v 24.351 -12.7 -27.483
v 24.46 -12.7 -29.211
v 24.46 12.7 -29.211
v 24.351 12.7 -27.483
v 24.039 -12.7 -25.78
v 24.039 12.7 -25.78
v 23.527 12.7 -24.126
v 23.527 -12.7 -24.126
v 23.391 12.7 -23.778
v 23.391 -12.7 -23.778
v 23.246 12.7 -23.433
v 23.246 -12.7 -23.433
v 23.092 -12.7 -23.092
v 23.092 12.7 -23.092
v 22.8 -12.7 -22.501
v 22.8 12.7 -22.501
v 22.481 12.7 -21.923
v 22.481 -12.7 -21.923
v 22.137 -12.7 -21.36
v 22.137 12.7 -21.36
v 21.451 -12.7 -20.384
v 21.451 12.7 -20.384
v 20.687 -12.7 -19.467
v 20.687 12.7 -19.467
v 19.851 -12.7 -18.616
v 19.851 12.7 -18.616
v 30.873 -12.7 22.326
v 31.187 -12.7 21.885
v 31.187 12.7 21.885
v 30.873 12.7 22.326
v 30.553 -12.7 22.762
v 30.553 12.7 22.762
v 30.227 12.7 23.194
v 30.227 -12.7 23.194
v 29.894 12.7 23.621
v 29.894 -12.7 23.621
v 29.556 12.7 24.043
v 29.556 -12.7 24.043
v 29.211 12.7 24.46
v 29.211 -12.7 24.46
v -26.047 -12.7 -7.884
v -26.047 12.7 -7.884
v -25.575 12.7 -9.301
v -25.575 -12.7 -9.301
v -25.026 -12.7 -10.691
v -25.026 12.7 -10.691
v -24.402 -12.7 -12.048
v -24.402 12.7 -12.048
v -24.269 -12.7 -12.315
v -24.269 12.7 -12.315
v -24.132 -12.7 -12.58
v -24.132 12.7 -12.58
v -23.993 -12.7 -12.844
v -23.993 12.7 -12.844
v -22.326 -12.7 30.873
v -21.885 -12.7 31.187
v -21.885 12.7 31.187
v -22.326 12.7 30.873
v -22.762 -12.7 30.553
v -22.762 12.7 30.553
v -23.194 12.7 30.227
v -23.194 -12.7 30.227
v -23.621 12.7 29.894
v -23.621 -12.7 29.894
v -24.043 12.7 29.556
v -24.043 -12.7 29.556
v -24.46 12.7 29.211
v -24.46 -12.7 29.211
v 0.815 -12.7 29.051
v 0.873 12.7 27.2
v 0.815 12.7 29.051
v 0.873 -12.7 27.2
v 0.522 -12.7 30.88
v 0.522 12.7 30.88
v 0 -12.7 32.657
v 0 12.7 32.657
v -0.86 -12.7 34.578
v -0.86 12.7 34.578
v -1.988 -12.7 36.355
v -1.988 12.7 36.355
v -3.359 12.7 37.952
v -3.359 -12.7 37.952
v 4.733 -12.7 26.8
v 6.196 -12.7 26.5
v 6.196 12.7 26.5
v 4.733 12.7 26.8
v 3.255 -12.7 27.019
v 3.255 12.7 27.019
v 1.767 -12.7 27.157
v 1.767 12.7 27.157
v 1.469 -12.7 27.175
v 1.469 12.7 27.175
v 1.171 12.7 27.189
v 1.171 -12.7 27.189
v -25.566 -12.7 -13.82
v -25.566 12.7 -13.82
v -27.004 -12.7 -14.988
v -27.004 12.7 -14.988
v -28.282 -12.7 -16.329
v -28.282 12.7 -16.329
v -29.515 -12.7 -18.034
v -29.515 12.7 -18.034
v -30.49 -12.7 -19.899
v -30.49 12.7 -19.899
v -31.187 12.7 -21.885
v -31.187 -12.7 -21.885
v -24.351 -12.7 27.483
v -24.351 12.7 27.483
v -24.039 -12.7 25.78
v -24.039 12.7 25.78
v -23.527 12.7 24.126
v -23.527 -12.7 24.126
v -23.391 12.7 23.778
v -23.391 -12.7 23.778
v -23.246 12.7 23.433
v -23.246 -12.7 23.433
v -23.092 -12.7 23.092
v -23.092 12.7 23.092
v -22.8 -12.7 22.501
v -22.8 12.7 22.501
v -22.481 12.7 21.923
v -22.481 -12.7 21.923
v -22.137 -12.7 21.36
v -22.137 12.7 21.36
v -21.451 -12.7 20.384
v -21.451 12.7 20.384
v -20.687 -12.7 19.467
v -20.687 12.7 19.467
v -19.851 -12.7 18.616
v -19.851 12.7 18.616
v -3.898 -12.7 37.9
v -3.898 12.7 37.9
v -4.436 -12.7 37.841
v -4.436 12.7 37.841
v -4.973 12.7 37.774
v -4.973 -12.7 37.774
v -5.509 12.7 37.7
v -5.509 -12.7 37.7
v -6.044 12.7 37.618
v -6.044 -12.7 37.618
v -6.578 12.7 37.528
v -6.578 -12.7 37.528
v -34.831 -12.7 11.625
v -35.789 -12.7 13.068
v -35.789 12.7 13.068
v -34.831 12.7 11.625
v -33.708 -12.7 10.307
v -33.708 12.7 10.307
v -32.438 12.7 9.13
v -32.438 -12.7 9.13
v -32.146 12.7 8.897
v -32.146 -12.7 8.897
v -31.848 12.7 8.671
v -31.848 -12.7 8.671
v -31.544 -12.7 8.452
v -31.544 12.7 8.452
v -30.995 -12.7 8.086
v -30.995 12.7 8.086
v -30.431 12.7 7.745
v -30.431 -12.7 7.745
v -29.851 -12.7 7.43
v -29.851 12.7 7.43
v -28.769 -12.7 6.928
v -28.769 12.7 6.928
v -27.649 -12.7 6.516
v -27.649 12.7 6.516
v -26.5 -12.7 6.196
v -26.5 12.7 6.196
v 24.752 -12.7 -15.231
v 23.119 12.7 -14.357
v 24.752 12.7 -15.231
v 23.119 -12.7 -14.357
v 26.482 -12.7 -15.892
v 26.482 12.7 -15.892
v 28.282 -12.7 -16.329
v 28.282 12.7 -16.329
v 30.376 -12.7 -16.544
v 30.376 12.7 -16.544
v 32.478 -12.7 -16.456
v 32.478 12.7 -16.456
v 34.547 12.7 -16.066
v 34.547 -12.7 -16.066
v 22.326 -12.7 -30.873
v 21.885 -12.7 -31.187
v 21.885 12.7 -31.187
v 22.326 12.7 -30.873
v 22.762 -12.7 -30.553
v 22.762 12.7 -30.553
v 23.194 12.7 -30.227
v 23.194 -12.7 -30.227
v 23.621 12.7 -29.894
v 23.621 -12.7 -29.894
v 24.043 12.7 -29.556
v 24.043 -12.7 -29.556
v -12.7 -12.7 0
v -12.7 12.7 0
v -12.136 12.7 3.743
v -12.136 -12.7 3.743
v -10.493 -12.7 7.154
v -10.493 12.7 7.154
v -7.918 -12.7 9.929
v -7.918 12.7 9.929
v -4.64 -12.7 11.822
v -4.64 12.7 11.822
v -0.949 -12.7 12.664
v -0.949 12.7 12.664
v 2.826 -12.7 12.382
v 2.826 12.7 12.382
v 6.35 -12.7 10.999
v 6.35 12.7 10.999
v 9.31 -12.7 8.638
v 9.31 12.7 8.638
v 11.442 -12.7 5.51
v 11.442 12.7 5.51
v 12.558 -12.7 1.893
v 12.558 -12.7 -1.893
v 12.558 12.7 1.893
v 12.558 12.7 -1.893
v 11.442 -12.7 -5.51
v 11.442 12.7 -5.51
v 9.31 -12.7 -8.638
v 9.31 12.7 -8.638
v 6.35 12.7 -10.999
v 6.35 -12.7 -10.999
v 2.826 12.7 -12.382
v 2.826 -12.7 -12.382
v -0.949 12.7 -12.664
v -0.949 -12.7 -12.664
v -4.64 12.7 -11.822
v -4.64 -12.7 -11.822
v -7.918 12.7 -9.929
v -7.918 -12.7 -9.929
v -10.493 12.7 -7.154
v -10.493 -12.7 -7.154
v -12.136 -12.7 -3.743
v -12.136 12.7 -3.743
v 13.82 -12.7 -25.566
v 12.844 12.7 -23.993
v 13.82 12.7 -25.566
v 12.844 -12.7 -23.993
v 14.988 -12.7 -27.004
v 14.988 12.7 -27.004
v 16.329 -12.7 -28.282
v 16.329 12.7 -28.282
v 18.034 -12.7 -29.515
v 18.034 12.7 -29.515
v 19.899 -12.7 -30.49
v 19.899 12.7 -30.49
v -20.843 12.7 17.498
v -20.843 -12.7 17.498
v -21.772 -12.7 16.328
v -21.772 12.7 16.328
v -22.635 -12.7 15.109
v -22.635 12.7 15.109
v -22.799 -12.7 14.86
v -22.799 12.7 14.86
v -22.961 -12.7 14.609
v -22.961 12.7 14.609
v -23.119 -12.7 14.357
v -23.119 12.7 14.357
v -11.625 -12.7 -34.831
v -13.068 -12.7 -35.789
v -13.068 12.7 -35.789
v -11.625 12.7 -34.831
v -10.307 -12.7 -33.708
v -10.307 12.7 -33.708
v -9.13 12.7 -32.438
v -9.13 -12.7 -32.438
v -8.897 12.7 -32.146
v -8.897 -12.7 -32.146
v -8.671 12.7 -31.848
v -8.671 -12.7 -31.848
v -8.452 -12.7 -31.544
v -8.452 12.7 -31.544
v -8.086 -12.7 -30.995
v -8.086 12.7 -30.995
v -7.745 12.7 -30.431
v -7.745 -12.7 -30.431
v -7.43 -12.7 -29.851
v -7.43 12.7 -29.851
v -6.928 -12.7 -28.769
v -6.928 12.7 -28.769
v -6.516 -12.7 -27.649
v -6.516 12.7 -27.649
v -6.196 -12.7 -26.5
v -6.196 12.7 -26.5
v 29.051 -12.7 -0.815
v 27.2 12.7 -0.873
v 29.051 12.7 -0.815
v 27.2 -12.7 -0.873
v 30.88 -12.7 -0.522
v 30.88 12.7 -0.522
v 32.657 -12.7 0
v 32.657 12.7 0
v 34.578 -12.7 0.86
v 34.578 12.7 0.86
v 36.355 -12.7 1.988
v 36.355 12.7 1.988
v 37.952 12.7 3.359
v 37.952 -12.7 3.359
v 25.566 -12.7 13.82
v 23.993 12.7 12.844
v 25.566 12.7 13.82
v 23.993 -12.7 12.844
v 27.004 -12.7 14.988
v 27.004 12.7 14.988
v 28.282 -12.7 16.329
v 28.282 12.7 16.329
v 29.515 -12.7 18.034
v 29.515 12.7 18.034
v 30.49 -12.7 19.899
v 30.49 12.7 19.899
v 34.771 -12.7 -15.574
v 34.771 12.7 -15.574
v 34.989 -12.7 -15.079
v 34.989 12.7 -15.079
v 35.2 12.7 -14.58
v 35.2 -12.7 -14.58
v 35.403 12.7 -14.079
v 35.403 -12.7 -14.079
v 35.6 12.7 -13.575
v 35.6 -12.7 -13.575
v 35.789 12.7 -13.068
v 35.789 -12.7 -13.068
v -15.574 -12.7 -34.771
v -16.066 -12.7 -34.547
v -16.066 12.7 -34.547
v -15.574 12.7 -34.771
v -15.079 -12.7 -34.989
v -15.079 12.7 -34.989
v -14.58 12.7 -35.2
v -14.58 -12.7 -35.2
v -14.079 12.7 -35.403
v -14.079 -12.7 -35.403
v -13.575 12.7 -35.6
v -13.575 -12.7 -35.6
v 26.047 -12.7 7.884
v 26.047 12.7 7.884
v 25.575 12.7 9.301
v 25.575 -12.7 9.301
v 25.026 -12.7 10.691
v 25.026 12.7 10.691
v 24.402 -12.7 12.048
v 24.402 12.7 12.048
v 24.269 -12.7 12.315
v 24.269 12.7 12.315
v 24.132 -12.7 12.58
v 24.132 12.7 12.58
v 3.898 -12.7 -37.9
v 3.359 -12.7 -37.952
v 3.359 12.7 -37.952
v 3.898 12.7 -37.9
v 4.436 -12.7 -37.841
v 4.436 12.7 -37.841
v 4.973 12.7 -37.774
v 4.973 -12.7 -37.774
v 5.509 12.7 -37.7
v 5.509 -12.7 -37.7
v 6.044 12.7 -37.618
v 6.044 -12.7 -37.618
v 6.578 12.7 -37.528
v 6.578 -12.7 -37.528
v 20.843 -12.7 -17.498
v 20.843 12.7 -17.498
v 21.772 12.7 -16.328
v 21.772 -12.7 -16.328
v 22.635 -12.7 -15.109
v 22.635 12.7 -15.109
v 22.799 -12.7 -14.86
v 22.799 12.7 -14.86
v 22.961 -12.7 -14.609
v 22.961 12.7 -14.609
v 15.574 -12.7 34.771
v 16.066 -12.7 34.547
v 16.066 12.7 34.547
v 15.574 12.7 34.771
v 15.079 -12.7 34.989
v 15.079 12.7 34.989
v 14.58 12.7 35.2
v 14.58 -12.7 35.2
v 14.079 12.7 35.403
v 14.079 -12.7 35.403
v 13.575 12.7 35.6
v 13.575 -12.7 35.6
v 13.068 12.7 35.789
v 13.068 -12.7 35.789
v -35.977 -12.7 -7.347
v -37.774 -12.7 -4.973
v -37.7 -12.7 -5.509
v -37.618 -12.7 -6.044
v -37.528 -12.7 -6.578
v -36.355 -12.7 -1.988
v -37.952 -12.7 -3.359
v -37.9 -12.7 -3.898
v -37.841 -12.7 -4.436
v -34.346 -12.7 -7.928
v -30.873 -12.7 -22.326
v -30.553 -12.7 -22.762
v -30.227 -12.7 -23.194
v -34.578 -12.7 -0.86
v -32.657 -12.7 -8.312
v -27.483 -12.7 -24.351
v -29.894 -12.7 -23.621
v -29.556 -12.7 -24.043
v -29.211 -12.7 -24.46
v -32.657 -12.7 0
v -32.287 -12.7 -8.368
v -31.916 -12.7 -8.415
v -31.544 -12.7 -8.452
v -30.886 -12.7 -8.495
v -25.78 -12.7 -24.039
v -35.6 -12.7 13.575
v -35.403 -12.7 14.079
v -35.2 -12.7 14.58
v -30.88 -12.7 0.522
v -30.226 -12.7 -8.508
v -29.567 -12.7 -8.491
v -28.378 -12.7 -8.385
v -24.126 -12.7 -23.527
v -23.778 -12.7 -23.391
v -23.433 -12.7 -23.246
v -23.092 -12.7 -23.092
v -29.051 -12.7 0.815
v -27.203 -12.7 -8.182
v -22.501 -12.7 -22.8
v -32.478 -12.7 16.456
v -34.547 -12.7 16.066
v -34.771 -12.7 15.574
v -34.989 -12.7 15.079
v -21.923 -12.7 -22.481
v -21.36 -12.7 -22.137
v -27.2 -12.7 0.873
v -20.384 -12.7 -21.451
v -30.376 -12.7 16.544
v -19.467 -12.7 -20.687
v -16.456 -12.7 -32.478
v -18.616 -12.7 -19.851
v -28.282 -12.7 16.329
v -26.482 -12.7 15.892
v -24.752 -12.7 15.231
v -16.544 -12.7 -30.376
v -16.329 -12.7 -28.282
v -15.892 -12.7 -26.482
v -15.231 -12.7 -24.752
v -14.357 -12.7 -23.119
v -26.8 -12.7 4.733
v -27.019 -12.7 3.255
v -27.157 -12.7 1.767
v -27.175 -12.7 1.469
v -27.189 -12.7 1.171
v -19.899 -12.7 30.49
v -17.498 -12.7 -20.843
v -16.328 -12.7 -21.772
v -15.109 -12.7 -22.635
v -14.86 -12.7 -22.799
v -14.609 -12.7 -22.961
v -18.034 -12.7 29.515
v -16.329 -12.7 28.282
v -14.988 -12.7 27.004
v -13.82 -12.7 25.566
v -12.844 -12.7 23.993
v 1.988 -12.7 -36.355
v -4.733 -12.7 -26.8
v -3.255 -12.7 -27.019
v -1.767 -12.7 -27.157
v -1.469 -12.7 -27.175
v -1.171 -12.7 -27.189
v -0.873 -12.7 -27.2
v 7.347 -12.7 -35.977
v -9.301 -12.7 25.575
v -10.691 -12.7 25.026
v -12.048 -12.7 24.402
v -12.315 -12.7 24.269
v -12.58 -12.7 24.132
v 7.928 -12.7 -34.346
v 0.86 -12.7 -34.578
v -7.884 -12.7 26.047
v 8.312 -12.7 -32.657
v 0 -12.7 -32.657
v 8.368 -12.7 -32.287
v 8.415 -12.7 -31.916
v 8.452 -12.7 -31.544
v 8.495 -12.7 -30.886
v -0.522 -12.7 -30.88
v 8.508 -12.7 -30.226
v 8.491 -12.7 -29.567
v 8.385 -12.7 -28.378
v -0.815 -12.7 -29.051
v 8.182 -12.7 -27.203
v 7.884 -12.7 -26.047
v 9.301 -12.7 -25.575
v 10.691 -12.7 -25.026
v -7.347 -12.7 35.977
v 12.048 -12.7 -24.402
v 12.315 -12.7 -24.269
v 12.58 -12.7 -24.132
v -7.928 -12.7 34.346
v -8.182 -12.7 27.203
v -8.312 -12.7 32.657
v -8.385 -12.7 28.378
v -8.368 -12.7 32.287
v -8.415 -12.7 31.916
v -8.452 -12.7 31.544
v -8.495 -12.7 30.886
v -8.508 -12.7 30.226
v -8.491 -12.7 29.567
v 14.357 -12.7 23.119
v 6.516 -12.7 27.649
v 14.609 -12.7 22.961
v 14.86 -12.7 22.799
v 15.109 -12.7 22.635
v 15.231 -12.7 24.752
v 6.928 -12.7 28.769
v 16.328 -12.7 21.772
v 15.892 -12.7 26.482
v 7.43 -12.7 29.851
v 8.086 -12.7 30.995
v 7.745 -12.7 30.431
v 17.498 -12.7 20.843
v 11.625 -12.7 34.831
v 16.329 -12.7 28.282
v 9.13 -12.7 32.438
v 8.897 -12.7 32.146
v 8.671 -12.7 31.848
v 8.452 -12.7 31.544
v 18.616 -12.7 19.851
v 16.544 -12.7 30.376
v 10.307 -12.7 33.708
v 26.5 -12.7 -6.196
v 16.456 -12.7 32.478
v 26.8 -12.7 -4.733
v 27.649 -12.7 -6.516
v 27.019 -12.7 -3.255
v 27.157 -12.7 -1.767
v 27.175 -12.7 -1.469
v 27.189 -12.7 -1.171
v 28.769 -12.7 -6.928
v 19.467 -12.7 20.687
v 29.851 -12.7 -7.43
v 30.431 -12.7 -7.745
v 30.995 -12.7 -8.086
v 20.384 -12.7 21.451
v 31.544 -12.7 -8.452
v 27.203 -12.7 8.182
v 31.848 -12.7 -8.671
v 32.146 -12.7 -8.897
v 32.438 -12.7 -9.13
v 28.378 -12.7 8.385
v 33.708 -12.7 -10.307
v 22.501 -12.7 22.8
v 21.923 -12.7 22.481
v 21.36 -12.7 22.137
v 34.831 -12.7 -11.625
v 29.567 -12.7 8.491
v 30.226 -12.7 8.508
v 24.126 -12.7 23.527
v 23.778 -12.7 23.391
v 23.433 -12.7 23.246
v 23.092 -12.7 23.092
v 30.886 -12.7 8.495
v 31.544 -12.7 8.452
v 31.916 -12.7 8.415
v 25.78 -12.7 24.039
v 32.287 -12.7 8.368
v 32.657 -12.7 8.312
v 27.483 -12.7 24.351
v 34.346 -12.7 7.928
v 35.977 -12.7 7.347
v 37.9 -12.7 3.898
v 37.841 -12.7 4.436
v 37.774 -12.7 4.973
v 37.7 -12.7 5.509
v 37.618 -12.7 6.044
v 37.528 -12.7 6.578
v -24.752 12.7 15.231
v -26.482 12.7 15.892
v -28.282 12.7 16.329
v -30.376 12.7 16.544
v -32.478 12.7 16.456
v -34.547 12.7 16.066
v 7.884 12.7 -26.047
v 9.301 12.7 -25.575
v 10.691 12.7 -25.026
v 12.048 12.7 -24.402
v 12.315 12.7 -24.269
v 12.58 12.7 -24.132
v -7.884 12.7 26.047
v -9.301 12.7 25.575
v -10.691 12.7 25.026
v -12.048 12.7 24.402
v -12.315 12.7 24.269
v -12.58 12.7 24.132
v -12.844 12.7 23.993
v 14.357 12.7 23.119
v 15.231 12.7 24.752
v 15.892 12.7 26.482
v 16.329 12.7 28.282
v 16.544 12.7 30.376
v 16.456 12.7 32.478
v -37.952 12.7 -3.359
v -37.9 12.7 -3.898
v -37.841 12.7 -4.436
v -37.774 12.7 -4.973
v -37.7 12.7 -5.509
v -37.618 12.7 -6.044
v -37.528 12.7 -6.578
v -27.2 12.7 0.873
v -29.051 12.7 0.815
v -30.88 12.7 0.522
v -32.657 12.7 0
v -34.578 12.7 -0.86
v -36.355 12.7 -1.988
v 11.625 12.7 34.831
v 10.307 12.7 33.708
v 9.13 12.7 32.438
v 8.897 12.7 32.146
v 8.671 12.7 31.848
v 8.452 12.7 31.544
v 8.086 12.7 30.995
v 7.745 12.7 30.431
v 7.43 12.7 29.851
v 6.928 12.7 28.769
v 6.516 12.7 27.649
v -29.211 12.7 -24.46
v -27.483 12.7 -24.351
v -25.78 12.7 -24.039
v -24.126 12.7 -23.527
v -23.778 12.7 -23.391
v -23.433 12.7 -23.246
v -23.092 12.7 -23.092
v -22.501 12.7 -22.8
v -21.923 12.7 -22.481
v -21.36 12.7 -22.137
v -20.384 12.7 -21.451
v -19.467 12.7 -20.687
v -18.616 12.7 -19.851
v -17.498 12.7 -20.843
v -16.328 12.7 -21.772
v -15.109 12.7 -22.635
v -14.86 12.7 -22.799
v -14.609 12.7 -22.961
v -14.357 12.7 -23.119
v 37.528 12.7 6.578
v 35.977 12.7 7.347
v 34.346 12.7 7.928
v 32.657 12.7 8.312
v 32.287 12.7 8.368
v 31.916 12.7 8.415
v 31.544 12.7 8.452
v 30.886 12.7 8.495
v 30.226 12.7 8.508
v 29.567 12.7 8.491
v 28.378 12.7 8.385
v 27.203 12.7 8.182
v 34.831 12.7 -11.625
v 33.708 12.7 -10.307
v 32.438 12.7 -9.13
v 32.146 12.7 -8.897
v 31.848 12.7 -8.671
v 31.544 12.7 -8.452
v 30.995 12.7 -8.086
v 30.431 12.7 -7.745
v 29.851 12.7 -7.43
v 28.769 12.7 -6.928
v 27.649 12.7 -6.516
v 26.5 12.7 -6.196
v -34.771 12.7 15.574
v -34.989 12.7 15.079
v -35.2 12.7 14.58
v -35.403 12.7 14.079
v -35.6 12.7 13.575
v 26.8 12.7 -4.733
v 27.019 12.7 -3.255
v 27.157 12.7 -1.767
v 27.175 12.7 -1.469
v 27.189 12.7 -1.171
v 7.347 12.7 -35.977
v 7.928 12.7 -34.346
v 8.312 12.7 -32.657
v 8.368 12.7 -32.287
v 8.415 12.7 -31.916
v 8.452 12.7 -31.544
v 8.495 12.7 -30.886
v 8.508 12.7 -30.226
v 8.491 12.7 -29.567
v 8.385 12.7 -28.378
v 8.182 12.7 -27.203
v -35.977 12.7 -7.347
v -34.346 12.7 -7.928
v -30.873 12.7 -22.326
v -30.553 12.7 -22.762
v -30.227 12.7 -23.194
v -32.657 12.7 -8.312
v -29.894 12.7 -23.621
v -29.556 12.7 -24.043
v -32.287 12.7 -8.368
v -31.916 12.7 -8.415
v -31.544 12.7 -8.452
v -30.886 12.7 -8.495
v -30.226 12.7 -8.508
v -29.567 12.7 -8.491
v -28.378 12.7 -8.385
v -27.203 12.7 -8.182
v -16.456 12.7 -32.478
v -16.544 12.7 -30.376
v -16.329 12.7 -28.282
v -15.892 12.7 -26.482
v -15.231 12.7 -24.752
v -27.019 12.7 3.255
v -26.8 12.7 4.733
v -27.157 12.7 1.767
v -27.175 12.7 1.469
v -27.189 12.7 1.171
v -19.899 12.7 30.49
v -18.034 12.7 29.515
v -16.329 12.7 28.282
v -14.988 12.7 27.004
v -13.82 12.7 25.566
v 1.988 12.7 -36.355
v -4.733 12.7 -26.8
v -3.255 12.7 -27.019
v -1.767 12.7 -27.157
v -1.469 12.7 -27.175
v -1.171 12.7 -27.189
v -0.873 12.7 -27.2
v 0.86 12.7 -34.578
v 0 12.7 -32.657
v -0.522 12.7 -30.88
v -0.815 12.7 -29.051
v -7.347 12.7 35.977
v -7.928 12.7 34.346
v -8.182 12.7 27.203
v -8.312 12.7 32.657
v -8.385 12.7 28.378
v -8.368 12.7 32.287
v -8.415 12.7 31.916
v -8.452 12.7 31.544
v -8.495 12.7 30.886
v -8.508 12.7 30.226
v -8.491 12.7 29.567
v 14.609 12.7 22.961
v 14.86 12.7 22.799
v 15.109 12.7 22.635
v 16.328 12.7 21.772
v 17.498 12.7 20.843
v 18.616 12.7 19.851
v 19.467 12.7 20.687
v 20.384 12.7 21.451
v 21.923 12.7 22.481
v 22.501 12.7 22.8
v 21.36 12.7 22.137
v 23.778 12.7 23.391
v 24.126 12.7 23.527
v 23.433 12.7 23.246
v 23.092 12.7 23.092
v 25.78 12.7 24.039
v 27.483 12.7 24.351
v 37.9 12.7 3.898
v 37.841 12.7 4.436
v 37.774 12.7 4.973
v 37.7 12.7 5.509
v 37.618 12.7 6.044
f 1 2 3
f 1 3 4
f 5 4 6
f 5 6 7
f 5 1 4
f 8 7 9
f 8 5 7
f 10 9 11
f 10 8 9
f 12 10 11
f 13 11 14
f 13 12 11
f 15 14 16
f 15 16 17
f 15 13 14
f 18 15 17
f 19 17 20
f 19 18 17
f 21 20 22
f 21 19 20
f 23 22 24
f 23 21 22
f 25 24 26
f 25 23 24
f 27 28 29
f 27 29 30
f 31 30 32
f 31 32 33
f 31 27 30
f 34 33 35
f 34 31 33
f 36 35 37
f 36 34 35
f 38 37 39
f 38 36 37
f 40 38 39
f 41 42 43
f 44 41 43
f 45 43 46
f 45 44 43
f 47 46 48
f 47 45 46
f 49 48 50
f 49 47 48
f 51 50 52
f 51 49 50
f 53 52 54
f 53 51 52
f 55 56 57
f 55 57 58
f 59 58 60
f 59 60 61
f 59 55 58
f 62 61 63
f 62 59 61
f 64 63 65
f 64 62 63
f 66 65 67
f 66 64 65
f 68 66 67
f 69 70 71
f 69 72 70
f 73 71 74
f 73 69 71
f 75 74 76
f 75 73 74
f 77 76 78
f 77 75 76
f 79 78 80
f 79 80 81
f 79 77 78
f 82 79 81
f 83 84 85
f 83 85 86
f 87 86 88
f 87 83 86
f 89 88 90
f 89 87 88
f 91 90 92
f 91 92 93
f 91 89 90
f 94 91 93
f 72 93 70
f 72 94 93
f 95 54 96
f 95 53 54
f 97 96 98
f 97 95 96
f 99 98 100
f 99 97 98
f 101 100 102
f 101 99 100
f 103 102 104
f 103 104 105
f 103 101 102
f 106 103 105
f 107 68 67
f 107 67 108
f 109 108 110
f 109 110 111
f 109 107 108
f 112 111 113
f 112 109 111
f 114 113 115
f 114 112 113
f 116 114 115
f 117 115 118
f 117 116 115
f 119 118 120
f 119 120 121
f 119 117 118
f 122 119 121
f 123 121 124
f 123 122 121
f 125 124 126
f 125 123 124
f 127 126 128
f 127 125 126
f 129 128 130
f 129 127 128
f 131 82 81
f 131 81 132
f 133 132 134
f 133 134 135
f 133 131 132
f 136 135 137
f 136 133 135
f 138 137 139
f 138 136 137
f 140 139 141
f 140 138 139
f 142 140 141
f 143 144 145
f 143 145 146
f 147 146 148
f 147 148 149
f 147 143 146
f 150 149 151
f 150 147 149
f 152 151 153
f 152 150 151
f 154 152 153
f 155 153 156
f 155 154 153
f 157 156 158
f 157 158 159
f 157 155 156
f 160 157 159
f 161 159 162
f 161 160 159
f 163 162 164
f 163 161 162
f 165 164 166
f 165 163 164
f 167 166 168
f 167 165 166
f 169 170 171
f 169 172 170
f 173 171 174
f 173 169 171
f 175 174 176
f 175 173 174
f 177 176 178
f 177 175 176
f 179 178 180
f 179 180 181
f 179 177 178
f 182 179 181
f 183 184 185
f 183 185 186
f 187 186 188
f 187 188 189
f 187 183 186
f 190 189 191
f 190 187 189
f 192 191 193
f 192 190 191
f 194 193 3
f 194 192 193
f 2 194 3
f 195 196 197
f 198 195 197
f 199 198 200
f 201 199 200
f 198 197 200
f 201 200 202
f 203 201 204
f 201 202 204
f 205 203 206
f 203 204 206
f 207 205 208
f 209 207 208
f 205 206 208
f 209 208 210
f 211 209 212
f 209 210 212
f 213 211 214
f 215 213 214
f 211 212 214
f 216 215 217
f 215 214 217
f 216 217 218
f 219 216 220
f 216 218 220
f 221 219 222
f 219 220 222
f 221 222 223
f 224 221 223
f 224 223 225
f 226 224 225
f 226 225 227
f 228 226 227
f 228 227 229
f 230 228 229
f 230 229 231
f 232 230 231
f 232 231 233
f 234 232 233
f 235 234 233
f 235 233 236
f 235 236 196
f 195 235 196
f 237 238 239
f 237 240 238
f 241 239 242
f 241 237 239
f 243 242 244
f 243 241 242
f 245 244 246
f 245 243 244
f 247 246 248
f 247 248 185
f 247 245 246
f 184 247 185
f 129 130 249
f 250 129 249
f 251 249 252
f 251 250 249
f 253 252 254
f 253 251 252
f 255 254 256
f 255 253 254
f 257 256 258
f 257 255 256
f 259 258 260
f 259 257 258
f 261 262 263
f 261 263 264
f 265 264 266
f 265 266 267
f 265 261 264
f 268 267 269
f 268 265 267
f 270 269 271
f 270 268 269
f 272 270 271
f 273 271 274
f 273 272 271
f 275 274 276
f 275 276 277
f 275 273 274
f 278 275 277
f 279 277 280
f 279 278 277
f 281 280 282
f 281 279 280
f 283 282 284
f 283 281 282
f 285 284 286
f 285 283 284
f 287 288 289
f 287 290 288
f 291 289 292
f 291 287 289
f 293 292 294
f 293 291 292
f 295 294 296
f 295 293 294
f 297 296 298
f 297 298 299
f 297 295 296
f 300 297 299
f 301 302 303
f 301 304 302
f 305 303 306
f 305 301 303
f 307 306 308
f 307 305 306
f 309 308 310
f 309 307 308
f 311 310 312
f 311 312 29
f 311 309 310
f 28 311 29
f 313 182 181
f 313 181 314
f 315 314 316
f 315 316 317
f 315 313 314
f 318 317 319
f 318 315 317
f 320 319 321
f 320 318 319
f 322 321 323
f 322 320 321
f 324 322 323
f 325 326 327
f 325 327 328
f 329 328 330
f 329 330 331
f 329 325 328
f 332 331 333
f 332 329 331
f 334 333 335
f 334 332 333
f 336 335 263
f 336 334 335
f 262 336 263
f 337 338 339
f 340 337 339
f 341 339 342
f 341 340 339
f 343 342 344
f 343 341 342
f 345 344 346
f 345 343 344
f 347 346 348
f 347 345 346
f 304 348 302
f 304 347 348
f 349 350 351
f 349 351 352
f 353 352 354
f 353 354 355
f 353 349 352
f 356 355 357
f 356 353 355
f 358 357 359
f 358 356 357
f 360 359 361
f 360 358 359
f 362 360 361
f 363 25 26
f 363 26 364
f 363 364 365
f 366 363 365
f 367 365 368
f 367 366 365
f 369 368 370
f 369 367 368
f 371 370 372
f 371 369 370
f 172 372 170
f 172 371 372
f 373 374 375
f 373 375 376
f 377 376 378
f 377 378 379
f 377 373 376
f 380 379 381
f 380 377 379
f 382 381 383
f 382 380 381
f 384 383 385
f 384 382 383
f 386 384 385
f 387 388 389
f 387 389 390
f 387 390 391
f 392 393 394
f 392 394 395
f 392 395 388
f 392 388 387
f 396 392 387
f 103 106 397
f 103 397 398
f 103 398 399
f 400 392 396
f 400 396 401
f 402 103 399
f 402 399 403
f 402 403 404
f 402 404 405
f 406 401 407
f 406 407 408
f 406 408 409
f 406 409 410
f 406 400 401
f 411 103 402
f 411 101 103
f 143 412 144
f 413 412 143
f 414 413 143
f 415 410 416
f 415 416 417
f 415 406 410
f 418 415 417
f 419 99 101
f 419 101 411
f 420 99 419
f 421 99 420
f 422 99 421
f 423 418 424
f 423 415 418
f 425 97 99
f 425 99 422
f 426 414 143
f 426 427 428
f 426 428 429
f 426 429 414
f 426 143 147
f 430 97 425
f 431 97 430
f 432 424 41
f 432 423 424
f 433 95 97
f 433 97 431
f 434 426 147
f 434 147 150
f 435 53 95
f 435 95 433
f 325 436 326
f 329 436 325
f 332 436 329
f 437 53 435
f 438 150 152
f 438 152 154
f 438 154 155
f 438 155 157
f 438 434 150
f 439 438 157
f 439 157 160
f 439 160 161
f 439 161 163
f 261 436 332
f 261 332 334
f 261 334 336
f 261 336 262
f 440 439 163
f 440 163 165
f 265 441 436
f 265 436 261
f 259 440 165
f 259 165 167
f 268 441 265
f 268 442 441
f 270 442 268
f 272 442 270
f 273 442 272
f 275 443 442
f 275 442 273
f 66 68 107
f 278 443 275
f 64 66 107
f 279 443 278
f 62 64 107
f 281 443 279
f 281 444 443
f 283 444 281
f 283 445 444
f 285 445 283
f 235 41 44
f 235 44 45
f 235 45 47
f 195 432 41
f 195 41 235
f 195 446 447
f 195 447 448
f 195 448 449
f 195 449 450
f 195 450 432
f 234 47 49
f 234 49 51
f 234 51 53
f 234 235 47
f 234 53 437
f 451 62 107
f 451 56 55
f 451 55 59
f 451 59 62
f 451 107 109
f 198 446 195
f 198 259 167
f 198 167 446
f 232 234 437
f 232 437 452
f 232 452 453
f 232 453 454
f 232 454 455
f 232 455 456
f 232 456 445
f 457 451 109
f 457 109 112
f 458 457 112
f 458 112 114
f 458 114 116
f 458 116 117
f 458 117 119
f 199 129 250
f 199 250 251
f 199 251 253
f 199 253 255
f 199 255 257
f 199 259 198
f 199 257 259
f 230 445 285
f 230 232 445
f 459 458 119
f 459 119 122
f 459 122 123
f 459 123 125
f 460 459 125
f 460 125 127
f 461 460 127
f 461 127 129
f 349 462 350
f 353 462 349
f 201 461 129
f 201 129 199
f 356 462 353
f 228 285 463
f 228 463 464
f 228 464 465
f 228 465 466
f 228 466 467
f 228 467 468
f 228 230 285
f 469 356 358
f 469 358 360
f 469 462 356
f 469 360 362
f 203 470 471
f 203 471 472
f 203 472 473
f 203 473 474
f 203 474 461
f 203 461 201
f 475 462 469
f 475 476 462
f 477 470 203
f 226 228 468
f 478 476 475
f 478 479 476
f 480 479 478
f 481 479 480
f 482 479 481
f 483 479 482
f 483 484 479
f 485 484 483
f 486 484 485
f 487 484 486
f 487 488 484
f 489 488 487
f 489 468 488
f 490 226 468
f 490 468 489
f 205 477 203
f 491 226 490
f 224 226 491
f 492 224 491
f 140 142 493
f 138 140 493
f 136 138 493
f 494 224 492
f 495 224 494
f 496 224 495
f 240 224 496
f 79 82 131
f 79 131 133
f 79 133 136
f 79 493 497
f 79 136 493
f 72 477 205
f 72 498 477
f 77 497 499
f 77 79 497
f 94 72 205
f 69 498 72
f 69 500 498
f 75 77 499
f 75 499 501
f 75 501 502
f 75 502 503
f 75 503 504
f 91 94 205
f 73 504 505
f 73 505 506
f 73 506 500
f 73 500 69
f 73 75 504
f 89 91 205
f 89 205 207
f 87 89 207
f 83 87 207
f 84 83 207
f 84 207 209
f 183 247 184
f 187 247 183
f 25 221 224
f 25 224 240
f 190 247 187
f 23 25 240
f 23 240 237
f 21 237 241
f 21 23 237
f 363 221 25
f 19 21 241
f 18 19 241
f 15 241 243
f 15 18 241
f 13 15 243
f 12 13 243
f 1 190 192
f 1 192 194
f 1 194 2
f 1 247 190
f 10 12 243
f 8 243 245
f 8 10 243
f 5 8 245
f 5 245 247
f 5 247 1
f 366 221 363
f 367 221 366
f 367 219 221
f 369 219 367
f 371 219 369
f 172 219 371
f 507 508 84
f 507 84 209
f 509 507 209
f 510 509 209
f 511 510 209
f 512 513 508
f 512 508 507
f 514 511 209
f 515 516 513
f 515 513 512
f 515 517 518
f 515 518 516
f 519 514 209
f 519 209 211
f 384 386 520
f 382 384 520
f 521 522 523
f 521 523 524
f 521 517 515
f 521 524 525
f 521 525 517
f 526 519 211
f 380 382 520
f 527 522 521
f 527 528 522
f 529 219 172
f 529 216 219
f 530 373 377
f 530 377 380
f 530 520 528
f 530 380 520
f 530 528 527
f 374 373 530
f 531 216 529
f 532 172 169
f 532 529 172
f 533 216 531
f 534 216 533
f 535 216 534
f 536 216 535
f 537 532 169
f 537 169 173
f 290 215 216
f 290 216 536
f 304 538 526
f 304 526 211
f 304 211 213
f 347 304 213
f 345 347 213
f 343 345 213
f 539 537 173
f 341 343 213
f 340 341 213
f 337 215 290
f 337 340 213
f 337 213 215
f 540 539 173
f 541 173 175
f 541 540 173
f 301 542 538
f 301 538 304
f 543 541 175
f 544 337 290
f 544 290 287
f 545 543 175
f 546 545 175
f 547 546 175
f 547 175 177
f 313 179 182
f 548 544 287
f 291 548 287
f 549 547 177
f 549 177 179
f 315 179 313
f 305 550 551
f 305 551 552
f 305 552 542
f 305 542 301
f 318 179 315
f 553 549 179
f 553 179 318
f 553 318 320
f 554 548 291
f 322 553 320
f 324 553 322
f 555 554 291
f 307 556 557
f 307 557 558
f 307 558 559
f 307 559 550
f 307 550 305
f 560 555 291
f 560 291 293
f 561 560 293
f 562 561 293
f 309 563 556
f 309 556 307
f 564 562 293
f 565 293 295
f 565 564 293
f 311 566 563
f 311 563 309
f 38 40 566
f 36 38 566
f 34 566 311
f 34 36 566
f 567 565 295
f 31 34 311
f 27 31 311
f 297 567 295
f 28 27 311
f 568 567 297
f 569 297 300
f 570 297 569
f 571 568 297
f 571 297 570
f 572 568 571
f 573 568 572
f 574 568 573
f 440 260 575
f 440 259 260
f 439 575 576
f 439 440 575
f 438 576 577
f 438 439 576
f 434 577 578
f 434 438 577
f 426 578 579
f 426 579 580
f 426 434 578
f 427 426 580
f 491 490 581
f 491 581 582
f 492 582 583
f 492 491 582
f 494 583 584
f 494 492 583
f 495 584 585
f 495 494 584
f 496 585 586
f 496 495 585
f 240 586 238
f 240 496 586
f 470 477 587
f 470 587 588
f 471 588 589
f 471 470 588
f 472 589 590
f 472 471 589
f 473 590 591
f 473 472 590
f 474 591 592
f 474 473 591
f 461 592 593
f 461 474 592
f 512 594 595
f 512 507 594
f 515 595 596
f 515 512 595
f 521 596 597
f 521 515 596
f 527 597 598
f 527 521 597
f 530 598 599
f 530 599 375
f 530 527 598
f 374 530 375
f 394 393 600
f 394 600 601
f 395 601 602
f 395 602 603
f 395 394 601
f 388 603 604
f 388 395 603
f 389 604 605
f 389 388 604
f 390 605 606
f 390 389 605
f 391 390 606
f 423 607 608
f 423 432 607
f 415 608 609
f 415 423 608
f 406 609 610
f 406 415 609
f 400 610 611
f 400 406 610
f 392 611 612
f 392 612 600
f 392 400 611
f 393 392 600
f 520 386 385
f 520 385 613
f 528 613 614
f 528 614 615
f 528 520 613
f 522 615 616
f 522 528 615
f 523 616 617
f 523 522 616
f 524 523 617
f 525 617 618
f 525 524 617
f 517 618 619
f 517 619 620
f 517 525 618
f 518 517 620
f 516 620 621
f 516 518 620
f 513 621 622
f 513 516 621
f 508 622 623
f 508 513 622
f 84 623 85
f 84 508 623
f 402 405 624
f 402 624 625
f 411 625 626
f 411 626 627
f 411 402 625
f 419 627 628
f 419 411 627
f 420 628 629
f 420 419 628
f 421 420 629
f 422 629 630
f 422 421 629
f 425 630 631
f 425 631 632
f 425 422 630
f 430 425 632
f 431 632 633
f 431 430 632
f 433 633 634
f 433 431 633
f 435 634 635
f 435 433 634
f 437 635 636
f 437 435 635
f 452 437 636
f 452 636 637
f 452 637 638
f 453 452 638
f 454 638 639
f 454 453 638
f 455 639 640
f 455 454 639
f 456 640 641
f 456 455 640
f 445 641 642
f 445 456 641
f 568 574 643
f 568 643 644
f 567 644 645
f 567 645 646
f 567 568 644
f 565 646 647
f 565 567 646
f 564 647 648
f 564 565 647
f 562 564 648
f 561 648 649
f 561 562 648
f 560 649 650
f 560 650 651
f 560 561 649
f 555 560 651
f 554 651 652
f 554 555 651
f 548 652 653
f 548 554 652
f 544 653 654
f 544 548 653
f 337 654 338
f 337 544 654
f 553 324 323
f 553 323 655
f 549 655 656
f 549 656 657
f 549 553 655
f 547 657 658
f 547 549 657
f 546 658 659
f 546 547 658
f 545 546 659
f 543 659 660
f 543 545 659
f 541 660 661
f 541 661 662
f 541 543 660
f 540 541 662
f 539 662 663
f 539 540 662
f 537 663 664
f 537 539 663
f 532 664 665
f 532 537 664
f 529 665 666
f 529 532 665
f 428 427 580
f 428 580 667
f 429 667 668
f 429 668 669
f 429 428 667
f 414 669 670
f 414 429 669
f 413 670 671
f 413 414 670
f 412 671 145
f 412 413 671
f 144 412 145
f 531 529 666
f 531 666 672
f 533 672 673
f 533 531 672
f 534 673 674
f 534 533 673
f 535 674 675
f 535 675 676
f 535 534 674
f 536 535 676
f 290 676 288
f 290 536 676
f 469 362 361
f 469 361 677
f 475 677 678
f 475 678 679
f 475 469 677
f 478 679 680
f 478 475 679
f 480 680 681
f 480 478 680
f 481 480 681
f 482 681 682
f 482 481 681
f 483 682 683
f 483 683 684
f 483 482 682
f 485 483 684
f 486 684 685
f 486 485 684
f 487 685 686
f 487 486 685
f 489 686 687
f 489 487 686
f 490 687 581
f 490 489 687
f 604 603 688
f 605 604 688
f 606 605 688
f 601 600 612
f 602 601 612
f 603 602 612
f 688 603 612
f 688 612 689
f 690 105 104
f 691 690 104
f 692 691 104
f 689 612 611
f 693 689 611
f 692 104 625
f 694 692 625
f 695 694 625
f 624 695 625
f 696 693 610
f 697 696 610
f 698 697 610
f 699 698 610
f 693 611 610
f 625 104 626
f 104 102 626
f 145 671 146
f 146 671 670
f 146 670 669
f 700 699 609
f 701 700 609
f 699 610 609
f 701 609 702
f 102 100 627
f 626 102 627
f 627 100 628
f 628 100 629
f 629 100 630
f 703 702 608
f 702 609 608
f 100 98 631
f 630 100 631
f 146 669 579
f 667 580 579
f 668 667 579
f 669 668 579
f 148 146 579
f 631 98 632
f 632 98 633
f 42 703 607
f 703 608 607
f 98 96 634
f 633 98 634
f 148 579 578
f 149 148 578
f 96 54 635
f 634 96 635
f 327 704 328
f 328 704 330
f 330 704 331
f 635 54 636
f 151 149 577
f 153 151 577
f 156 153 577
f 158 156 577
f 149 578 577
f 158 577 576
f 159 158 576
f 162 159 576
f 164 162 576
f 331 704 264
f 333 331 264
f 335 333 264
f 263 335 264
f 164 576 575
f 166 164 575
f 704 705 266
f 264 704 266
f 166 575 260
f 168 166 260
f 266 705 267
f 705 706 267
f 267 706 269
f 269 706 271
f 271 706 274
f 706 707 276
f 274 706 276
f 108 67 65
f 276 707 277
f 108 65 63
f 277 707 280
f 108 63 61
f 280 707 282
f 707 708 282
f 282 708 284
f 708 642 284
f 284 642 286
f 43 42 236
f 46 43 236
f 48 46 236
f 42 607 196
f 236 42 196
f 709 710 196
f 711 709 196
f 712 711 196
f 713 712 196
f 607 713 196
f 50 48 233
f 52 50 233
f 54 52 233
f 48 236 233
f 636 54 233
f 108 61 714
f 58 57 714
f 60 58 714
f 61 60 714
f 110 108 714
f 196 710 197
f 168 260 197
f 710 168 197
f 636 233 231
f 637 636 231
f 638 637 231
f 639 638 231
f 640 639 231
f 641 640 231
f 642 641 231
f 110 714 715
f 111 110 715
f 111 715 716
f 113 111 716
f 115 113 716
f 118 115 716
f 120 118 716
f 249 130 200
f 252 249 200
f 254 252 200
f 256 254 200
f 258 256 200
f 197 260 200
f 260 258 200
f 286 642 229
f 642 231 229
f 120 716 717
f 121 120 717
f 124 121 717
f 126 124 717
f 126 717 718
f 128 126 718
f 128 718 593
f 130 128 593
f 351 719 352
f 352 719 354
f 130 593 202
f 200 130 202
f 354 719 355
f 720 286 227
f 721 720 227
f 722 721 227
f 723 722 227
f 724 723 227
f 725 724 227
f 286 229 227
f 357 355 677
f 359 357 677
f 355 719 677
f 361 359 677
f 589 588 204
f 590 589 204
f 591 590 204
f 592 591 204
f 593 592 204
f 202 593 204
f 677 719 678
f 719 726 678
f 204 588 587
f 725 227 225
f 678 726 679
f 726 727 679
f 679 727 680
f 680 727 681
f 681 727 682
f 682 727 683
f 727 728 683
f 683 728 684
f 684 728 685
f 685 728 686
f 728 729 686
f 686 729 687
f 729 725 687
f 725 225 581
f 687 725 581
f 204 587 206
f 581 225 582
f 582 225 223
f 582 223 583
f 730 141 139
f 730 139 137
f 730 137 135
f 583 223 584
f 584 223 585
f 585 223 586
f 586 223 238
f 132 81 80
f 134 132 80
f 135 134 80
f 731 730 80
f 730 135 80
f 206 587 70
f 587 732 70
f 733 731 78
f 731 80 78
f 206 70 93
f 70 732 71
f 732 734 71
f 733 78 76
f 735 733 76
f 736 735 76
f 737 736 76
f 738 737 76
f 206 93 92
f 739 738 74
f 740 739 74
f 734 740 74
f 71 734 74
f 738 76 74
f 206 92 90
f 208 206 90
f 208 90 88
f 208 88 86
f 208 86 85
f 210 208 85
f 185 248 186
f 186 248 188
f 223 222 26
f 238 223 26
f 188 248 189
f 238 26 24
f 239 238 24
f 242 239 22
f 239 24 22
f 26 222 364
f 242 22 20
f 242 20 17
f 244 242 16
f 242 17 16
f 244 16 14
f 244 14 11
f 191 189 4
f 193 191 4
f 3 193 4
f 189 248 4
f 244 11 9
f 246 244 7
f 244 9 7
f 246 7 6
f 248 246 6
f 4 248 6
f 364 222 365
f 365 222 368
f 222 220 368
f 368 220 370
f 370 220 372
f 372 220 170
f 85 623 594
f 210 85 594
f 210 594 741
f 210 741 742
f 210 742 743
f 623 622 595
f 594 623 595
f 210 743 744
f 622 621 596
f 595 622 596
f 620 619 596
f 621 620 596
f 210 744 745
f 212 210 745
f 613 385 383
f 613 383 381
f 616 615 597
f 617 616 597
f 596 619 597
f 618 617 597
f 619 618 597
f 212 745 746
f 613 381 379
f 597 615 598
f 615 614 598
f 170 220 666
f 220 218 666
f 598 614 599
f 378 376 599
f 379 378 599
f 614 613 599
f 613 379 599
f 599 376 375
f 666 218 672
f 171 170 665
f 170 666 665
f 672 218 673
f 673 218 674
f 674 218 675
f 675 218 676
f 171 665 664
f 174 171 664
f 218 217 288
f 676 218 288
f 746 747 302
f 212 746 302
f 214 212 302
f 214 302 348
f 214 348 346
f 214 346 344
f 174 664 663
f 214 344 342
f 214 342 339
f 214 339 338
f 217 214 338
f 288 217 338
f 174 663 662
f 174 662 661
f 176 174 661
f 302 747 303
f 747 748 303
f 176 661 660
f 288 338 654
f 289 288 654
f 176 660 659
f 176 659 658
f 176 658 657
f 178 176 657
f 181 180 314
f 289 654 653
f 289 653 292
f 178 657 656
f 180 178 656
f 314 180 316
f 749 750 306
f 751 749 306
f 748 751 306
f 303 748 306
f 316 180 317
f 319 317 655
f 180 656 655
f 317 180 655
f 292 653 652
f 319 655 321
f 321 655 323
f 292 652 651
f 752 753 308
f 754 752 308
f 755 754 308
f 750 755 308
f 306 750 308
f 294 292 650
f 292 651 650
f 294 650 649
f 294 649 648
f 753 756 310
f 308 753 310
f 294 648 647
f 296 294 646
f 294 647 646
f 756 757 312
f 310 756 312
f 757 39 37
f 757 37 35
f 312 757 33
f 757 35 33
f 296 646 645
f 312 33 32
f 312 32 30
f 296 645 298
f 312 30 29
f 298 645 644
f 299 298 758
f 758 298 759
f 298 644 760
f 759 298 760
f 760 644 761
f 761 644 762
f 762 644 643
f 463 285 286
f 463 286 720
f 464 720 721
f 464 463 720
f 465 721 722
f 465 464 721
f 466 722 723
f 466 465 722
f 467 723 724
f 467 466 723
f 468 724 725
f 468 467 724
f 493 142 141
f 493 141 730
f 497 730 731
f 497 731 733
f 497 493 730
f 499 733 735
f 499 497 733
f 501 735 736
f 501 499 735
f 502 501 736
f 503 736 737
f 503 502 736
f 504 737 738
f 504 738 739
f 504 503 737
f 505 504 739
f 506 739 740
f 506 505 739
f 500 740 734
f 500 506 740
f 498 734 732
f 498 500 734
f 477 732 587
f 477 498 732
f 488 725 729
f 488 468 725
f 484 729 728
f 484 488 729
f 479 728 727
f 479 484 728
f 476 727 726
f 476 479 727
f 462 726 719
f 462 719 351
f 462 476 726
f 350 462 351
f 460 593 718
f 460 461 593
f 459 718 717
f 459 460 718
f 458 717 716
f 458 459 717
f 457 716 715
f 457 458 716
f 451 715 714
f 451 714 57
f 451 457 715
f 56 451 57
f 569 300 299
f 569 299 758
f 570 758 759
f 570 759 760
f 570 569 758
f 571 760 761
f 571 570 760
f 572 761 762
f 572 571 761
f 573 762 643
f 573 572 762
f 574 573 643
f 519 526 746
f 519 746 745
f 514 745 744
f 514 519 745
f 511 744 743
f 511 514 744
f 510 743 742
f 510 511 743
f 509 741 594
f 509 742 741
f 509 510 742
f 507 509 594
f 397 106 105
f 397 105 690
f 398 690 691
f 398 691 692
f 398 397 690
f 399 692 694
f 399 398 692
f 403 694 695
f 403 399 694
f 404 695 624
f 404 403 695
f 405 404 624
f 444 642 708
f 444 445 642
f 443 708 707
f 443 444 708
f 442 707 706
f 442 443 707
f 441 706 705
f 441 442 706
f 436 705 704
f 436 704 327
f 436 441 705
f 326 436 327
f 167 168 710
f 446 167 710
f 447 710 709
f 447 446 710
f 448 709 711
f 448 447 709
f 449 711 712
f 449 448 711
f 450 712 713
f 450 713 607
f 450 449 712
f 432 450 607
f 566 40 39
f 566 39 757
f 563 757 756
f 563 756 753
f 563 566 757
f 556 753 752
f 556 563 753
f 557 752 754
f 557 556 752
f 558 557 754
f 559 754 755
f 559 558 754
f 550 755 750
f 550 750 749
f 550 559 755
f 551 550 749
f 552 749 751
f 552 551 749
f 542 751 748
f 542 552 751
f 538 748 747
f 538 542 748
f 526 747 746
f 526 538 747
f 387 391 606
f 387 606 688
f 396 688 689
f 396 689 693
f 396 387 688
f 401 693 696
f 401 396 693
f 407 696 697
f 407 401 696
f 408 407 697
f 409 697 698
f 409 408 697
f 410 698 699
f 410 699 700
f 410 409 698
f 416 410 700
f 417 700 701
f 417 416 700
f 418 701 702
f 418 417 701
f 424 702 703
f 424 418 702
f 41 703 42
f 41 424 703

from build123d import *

# Parameters (mm, degrees)
F2_DEPTH = 12.7
F3_COUNT = 12
F3_ANGLE = 330
F5_D     = 25.4


with BuildPart() as f2:
    # F1 (on Front) → F2 (new body, symmetric)
    with BuildSketch(Plane.XZ):
        with BuildLine():
            Line((0, 27.2142857143), (0, 32.6571428571))
            Line((0, 32.6571428571), (-4.1027982168, 31.163846429))
            Line((-4.1027982168, 31.163846429), (-3.5521770883, 26.9814637274))
            ThreePointArc((-3.5521770883, 26.9814637274), (-1.7798994455, 27.1560178396), (0, 27.2142857143))
        make_face()
        with BuildLine():
            Line((-3.5521770883, 26.9814637274), (-4.1027982168, 31.163846429))
            Line((-4.1027982168, 31.163846429), (-8.4908538679, 29.5667247857))
            ThreePointArc((-8.4908538679, 29.5667247857), (-8.2952422965, 27.7884140488), (-7.8836733992, 26.0473614916))
            ThreePointArc((-7.8836733992, 26.0473614916), (-5.7369683492, 26.6027167992), (-3.5521770883, 26.9814637274))
        make_face()
        with BuildLine():
            Line((-4.1027982168, 31.163846429), (-4.2626125059, 32.3777564729))
            ThreePointArc((-4.2626125059, 32.3777564729), (-6.3710925161, 32.0296450143), (-8.4522905301, 31.5443776985))
            ThreePointArc((-8.4522905301, 31.5443776985), (-8.5050911091, 30.5562048457), (-8.4908538679, 29.5667247857))
            Line((-8.4908538679, 29.5667247857), (-4.1027982168, 31.163846429))
        make_face()
        with BuildLine():
            ThreePointArc((-8.4522905301, 31.5443776985), (-6.3710925161, 32.0296450143), (-4.2626125059, 32.3777564729))
            Line((-4.2626125059, 32.3777564729), (-4.2993944212, 32.6571428571))
            Line((-4.2993944212, 32.6571428571), (-8.3117038653, 32.6571428571))
            ThreePointArc((-8.3117038653, 32.6571428571), (-8.3926831774, 32.1021103437), (-8.4522905301, 31.5443776985))
        make_face()
        with BuildLine():
            Line((-4.1027982168, 31.163846429), (0, 32.6571428571))
            ThreePointArc((0, 32.6571428571), (-2.1358793346, 32.5872214075), (-4.2626125059, 32.3777564729))
            Line((-4.2626125059, 32.3777564729), (-4.1027982168, 31.163846429))
        make_face()
        with BuildLine():
            ThreePointArc((-4.2626125059, 32.3777564729), (-2.1358793346, 32.5872214075), (0, 32.6571428571))
            Line((0, 32.6571428571), (-4.2993944212, 32.6571428571))
            Line((-4.2993944212, 32.6571428571), (-4.2626125059, 32.3777564729))
        make_face()
        with BuildLine():
            ThreePointArc((0, 32.6571428571), (-1.3922286837, 35.486786515), (-3.3594239194, 37.9516043262))
            ThreePointArc((-3.3594239194, 37.9516043262), (-4.1671816864, 37.8714219009), (-4.9730479236, 37.7740492183))
            Line((-4.9730479236, 37.7740492183), (-4.2993944212, 32.6571428571))
            Line((-4.2993944212, 32.6571428571), (0, 32.6571428571))
        make_face()
        with BuildLine():
            Line((-4.2993944212, 32.6571428571), (-4.9730479236, 37.7740492183))
            ThreePointArc((-4.9730479236, 37.7740492183), (-5.7766568393, 37.6595304772), (-6.5776436666, 37.5279176587))
            ThreePointArc((-6.5776436666, 37.5279176587), (-7.661923736, 35.1698741183), (-8.3117038653, 32.6571428571))
            Line((-8.3117038653, 32.6571428571), (-4.2993944212, 32.6571428571))
        make_face()
        with BuildLine():
            ThreePointArc((0.8734905136, 27.2002639925), (0.6971989167, 29.9703946199), (0, 32.6571428571))
            Line((0, 32.6571428571), (0, 27.2142857143))
            ThreePointArc((0, 27.2142857143), (0.4368015242, 27.210780058), (0.8734905136, 27.2002639925))
        make_face()
        with BuildLine():
            ThreePointArc((27.2142857143, 0), (23.1138516304, 14.3654867564), (12.0481915595, 24.4020168651))
            ThreePointArc((12.0481915595, 24.4020168651), (6.8095488061, 19.7367686343), (0, 18.0521428571))
            Line((0, 18.0521428571), (0, 0))
            Line((0, 0), (-2.402809942, 18.2511534992))
            ThreePointArc((-2.402809942, 18.2511534992), (-7.8527791982, 20.3429281496), (-12.0481915595, 24.4020168651))
            ThreePointArc((-12.0481915595, 24.4020168651), (-14.3654867564, -23.1138516304), (27.2142857143, 0))
        make_face()
        with BuildLine():
            ThreePointArc((-7.8836733992, 26.0473614916), (-9.9998299945, 25.3104868981), (-12.0481915595, 24.4020168651))
            ThreePointArc((-12.0481915595, 24.4020168651), (-7.8527791982, 20.3429281496), (-2.402809942, 18.2511534992))
            Line((-2.402809942, 18.2511534992), (-3.5521770883, 26.9814637274))
            ThreePointArc((-3.5521770883, 26.9814637274), (-5.7369683492, 26.6027167992), (-7.8836733992, 26.0473614916))
        make_face()
        with BuildLine():
            Line((0, 18.0521428571), (0, 27.2142857143))
            ThreePointArc((0, 27.2142857143), (-1.7798994455, 27.1560178396), (-3.5521770883, 26.9814637274))
            Line((-3.5521770883, 26.9814637274), (-2.402809942, 18.2511534992))
            ThreePointArc((-2.402809942, 18.2511534992), (-1.2055186491, 18.10198055), (0, 18.0521428571))
        make_face()
        with BuildLine():
            Line((0, 0), (0, 18.0521428571))
            ThreePointArc((0, 18.0521428571), (-1.2055186491, 18.10198055), (-2.402809942, 18.2511534992))
            Line((-2.402809942, 18.2511534992), (0, 0))
        make_face()
        with BuildLine():
            ThreePointArc((0.8734905136, 27.2002639925), (0.4368015242, 27.210780058), (0, 27.2142857143))
            Line((0, 27.2142857143), (0, 18.0521428571))
            ThreePointArc((0, 18.0521428571), (6.8095488061, 19.7367686343), (12.0481915595, 24.4020168651))
            ThreePointArc((12.0481915595, 24.4020168651), (6.6105985846, 26.399191906), (0.8734905136, 27.2002639925))
        make_face()
    extrude(amount=F2_DEPTH, both=True)

    # F3: F2 ×12 about axis
    f3_axis = Axis((0, 0, 0), (0, -1, 0))


with BuildPart() as f2_1:
    add(f2.part)
    for i in range(1, F3_COUNT):
        add(f2.part.rotate(f3_axis, i * F3_ANGLE / (F3_COUNT - 1)))

    # F5 (through all)
    with Locations(Plane.XZ.offset(12.7)):
        with Locations((0, 0)):
            Hole(F5_D / 2)


solid = f2_1.part
